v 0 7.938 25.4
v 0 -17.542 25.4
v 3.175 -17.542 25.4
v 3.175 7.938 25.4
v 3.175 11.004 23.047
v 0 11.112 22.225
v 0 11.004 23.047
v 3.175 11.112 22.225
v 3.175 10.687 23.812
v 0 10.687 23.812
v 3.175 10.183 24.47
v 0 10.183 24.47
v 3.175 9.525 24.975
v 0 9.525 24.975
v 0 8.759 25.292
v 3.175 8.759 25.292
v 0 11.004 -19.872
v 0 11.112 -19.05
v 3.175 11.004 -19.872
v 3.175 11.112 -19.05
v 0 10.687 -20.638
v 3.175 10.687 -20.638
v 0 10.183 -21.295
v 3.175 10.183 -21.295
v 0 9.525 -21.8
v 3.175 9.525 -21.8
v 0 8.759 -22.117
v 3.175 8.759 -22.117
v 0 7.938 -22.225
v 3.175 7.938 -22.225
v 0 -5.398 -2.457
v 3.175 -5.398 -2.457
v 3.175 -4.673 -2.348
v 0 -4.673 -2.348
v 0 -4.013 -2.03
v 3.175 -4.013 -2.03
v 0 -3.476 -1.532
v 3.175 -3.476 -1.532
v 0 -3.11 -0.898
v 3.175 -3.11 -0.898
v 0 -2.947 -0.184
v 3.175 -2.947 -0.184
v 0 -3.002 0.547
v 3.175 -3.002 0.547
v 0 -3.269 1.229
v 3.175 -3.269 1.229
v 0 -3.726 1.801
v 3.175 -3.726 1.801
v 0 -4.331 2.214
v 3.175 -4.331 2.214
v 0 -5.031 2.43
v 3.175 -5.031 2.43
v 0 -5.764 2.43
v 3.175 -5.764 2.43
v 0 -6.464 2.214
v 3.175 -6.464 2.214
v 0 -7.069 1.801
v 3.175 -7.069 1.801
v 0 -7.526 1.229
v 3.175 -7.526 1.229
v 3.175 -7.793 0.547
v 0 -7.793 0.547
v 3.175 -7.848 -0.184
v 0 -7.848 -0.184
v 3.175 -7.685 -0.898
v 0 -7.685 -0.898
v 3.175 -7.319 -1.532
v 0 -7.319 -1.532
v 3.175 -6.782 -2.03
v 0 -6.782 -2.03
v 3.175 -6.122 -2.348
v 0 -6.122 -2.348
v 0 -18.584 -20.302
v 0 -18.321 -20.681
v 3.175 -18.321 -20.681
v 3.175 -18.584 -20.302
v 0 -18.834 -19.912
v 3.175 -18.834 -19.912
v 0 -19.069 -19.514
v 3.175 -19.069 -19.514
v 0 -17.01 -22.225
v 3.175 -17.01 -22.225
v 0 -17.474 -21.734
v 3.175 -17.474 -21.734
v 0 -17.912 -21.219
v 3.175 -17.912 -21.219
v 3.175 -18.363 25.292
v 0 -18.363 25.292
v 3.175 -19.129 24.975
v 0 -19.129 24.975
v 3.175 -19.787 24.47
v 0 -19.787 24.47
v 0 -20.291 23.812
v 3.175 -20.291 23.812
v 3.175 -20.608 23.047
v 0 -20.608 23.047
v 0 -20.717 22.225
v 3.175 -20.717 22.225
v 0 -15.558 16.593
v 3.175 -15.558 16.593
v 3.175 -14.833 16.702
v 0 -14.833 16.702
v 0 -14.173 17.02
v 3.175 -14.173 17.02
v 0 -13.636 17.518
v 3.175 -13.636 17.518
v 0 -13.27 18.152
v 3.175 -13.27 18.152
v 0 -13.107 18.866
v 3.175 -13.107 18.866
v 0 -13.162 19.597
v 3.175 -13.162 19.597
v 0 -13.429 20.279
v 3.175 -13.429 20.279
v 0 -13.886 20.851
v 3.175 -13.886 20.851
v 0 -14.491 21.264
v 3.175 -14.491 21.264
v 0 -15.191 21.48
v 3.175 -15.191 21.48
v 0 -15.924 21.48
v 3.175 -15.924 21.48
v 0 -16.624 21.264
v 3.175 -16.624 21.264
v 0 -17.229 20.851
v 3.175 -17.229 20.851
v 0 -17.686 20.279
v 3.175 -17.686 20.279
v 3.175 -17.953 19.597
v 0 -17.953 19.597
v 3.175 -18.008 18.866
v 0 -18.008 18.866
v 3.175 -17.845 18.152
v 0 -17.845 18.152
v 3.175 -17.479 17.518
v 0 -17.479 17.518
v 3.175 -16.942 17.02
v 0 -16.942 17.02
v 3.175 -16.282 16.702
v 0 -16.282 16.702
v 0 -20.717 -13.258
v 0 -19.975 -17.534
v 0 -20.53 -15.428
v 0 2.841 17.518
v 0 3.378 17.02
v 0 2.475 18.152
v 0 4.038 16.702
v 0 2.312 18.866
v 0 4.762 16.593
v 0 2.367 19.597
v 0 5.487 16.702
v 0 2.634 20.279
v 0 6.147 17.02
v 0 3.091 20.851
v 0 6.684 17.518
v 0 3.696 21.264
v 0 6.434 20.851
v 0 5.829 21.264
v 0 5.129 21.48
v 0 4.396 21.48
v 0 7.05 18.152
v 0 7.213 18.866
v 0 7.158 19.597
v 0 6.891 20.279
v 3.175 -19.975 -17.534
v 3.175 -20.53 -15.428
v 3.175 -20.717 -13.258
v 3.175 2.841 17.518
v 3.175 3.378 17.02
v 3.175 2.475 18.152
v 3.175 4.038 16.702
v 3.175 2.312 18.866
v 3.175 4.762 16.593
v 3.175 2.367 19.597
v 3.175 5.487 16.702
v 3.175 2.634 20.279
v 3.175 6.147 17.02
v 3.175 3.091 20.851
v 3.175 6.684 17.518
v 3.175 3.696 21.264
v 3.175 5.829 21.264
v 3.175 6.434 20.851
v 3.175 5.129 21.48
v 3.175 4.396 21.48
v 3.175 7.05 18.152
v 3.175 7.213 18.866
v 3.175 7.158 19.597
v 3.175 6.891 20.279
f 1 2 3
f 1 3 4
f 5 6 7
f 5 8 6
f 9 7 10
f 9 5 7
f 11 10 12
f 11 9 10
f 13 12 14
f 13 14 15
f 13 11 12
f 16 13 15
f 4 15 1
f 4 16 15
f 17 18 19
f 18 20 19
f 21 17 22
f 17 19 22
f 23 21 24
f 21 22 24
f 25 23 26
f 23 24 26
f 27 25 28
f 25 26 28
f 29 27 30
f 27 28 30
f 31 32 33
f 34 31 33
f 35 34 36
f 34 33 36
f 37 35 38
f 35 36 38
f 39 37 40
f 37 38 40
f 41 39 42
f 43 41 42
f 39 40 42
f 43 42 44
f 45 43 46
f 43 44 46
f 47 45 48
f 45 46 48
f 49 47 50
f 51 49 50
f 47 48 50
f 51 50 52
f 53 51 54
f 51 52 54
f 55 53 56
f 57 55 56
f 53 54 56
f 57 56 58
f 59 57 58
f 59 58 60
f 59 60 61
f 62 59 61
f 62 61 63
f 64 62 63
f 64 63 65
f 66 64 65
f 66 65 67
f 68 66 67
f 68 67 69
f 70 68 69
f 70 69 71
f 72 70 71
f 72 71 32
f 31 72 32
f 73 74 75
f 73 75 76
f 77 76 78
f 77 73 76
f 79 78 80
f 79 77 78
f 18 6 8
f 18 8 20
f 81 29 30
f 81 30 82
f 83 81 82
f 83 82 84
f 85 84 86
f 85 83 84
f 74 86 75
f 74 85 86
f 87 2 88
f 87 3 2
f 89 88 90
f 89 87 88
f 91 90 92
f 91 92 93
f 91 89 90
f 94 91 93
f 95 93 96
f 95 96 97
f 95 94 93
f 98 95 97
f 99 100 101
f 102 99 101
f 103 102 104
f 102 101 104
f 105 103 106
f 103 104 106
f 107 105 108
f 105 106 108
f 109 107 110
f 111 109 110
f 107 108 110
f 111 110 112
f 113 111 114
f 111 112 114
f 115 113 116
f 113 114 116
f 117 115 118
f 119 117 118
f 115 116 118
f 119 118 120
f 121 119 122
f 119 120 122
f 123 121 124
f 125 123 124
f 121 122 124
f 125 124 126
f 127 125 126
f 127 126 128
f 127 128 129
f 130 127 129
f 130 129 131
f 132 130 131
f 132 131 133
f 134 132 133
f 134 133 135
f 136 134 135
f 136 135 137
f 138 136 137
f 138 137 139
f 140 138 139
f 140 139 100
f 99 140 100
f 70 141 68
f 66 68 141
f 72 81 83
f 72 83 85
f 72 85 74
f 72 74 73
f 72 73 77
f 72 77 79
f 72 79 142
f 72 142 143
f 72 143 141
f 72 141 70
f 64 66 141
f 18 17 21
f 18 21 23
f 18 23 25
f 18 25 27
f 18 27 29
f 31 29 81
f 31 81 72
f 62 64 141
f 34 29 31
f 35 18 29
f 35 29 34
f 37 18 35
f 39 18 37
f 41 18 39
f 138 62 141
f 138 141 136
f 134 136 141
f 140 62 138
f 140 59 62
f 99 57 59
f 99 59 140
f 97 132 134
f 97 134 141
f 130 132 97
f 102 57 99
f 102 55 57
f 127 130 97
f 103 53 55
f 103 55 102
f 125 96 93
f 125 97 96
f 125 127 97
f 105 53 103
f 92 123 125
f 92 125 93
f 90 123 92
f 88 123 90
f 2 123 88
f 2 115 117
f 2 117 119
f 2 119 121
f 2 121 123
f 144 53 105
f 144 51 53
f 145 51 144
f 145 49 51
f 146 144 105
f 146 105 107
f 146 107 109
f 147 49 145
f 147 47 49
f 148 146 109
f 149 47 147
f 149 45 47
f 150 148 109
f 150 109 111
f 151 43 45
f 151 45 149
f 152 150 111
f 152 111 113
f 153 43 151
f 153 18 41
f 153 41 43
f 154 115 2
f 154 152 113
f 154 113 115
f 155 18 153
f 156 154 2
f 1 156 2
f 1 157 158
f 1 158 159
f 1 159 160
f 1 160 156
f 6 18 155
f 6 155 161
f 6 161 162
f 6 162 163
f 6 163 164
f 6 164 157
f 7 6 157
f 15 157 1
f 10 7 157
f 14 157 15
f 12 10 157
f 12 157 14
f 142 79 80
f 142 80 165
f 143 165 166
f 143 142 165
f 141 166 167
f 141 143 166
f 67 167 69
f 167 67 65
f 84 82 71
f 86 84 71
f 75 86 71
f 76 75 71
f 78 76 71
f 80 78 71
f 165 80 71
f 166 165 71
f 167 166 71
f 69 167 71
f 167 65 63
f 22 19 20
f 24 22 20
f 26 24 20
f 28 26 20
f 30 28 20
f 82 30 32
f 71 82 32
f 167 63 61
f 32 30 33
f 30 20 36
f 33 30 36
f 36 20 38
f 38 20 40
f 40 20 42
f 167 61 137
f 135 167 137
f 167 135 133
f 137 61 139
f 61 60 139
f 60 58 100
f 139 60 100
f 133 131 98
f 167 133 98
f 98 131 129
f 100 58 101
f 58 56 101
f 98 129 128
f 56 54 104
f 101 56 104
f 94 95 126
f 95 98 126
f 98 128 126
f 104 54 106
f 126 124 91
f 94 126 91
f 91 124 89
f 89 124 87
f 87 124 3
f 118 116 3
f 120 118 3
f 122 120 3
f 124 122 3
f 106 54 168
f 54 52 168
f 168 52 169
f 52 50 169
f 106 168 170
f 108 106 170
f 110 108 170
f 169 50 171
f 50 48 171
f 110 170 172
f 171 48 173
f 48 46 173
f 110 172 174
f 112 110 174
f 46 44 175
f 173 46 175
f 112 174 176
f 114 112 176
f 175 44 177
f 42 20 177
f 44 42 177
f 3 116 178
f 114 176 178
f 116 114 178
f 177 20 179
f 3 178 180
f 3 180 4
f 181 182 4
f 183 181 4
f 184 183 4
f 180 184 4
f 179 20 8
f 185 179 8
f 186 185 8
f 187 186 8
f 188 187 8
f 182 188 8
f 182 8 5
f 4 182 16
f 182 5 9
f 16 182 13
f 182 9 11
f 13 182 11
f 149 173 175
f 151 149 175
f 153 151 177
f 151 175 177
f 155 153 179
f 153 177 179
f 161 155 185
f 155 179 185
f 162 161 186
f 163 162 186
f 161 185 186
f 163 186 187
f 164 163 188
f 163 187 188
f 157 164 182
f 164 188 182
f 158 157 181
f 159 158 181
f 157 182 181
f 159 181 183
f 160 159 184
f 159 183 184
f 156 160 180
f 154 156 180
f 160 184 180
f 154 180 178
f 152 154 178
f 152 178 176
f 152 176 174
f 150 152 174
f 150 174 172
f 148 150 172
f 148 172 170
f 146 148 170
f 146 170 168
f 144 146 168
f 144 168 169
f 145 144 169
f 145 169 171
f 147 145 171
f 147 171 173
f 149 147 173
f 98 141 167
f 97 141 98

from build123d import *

# Parameters (mm, degrees)
BOSS_EXTRUDE1_DEPTH              = 3.175
F_10_0_1935_DIAMETER_HOLE1_D     = 4.9149
F_10_0_1935_DIAMETER_HOLE1_DEPTH = 9.699415072
F_10_0_1935_DIAMETER_HOLE1_TIP   = 1.476584928
FILLET1_R                        = 3.175


with BuildPart() as part:
    # Sketch1 → Boss-Extrude1 (new body)
    with BuildSketch(Plane(origin=(0, 0, 0), x_dir=(0, 0, -1), z_dir=(1, 0, 0))):
        with BuildLine():
            Line((-25.4, 11.1125), (22.225, 11.1125))
            Line((22.225, 11.1125), (22.225, -17.010023672))
            ThreePointArc((22.225, -17.010023672), (21.479421476, -17.696337769), (20.681497174, -18.321022636))
            ThreePointArc((20.681497174, -18.321022636), (20.108002708, -18.71085711), (19.51408533, -19.068808178))
            ThreePointArc((19.51408533, -19.068808178), (16.492659011, -20.297805158), (13.257849362, -20.716681165))
            Line((13.257849362, -20.716681165), (-25.4, -20.716681165))
            Line((-25.4, -20.716681165), (-25.4, 11.1125))
        make_face()
    extrude(amount=BOSS_EXTRUDE1_DEPTH)

    # #10 (0.1935) Diameter Hole1
    with Locations(Plane.ZY):
        with Locations((19.05, 4.7625), (19.05, -15.5575), (0, -5.3975)):
            Hole(F_10_0_1935_DIAMETER_HOLE1_D / 2, depth=F_10_0_1935_DIAMETER_HOLE1_DEPTH)
            with Locations((0, 0, -(F_10_0_1935_DIAMETER_HOLE1_DEPTH + F_10_0_1935_DIAMETER_HOLE1_TIP / 2))):  # 118° drill point
                Cone(0, F_10_0_1935_DIAMETER_HOLE1_D / 2, F_10_0_1935_DIAMETER_HOLE1_TIP, mode=Mode.SUBTRACT)

    # Fillet1
    fillet1_edges = [part.edges().sort_by_distance(p)[0] for p in [
        (1.5875, 11.1125, 25.4),
        (1.5875, 11.1125, -22.225),
        (1.5875, -20.716681165, 25.4),
    ]]
    fillet(fillet1_edges, radius=FILLET1_R)


solid = part.part
